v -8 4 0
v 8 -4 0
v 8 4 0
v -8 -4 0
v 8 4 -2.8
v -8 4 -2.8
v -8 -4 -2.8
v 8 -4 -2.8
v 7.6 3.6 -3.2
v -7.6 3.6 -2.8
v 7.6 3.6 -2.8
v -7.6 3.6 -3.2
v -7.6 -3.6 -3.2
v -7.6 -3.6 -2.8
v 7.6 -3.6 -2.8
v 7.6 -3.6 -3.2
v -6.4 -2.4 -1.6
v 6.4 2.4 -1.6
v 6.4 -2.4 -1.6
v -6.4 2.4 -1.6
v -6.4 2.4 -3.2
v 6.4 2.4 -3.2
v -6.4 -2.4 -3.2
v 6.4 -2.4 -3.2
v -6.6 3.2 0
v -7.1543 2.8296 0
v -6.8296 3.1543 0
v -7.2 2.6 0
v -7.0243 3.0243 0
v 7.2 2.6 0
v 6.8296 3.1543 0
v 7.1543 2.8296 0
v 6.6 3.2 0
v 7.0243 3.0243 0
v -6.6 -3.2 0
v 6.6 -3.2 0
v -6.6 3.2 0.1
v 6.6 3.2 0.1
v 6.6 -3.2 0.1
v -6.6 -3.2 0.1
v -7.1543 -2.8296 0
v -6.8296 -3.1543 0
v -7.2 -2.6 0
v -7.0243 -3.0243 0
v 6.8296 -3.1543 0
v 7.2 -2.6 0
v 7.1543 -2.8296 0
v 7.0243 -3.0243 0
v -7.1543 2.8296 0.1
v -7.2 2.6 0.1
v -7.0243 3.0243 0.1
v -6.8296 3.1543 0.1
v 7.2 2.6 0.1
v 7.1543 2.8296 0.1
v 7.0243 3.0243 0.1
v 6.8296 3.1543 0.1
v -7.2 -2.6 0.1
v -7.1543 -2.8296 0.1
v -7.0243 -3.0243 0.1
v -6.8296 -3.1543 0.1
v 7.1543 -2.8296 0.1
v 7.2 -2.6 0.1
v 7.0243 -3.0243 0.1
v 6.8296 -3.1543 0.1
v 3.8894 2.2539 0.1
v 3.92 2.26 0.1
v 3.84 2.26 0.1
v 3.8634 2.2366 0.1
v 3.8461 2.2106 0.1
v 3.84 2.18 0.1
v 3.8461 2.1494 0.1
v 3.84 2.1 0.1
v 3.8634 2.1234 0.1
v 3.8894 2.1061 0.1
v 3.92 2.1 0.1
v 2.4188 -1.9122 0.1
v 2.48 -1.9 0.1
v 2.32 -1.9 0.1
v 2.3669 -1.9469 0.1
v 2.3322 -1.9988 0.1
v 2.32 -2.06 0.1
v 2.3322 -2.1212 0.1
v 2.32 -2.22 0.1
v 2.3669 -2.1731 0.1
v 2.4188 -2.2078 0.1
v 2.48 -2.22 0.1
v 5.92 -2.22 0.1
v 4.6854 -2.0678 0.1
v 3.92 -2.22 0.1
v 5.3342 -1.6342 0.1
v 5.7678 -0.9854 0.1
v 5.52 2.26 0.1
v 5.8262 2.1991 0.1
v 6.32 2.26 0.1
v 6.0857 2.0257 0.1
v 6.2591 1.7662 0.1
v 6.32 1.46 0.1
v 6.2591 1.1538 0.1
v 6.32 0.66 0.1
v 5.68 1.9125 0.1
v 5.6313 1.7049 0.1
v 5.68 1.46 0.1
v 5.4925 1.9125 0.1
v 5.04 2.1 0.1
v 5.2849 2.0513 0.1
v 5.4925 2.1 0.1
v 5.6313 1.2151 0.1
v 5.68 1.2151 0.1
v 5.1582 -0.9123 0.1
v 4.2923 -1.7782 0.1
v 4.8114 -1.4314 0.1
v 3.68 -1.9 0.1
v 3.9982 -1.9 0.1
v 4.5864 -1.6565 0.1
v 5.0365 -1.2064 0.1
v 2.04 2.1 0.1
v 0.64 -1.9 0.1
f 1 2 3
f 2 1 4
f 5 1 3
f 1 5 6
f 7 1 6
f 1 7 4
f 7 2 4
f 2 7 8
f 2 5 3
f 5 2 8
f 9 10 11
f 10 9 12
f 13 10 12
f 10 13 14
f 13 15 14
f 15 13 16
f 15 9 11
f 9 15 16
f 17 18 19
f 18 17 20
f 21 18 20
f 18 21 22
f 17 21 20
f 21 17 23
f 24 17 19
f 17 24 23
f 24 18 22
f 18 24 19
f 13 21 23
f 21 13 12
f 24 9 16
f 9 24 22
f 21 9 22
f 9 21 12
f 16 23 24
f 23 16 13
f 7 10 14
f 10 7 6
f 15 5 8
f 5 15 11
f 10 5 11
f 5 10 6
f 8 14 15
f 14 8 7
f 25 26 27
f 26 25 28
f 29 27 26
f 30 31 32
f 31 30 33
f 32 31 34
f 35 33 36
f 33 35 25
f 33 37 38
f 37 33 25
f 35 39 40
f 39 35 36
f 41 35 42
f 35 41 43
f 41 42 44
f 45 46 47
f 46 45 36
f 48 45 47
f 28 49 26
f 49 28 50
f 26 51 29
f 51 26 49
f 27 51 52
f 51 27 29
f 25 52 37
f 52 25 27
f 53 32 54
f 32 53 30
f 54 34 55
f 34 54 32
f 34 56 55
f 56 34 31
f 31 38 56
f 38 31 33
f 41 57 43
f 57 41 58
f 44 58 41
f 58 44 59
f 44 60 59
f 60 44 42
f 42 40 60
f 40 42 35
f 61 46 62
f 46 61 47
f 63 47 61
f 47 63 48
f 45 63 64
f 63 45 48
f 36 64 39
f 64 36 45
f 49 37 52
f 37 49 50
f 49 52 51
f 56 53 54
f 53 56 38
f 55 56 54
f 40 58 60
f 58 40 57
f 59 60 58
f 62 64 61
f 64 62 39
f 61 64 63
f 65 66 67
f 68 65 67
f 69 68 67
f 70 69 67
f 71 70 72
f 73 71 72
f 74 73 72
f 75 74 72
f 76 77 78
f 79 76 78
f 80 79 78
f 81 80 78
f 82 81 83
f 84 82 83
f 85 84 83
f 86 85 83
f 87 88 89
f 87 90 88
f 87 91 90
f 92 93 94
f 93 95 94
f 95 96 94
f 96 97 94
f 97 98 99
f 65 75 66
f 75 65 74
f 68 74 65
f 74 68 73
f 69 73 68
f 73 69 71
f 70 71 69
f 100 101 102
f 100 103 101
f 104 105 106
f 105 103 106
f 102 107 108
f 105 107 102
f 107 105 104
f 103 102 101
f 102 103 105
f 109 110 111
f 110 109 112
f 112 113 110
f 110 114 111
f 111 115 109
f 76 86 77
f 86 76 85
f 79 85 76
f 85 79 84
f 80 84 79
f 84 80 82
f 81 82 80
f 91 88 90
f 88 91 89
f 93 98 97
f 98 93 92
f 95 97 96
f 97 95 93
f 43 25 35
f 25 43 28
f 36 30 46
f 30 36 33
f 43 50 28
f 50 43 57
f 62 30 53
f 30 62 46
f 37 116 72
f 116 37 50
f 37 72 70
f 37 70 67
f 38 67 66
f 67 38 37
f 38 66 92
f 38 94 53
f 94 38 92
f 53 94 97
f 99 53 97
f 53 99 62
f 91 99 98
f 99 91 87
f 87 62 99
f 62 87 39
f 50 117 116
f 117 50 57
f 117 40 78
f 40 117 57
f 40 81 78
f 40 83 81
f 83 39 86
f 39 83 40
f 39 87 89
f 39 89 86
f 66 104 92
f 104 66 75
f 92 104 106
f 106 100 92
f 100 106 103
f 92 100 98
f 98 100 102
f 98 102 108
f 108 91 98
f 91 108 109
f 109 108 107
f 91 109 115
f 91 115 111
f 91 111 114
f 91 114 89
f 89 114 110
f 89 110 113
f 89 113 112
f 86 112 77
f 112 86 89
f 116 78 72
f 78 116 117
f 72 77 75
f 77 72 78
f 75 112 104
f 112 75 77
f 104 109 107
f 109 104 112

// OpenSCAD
// file: ../p/box5.scad
use <../lib.scad>
function ldraw_lib__box5() = [
// 0 Box with 5 Faces and All Edges
// 0 Name: box5.dat
// 0 Author: James Jessiman
// 0 !LDRAW_ORG Primitive UPDATE 2012-01
// 0 !LICENSE Licensed under CC BY 4.0 : see CAreadme.txt
// 
// 0 BFC CERTIFY CCW
  [0,"BFC","CERTIFY"],
  [0,"BFC","CCW"],
// 
// 0 !HISTORY 2002-04-03 [sbliss] Modified for BFC compliance
// 0 !HISTORY 2002-04-25 [PTadmin] Official Update 2002-02
// 0 !HISTORY 2007-06-24 [PTadmin] Header formatted for Contributor Agreement
// 0 !HISTORY 2008-07-01 [PTadmin] Official Update 2008-01
// 0 !HISTORY 2012-02-16 [Philo] Changed to CCW
// 0 !HISTORY 2012-03-30 [PTadmin] Official Update 2012-01
// 
// 
// 2 24 1 1 1 -1 1 1
  [2,24,1,1,1,-1,1,1],
// 2 24 -1 1 1 -1 1 -1
  [2,24,-1,1,1,-1,1,-1],
// 2 24 -1 1 -1 1 1 -1
  [2,24,-1,1,-1,1,1,-1],
// 2 24 1 1 -1 1 1 1
  [2,24,1,1,-1,1,1,1],
// 2 24 1 0 1 -1 0 1
  [2,24,1,0,1,-1,0,1],
// 2 24 -1 0 1 -1 0 -1
  [2,24,-1,0,1,-1,0,-1],
// 2 24 -1 0 -1 1 0 -1
  [2,24,-1,0,-1,1,0,-1],
// 2 24 1 0 -1 1 0 1
  [2,24,1,0,-1,1,0,1],
// 2 24 1 0 1 1 1 1
  [2,24,1,0,1,1,1,1],
// 2 24 -1 0 1 -1 1 1
  [2,24,-1,0,1,-1,1,1],
// 2 24 1 0 -1 1 1 -1
  [2,24,1,0,-1,1,1,-1],
// 2 24 -1 0 -1 -1 1 -1
  [2,24,-1,0,-1,-1,1,-1],
// 4 16 -1 1 1 1 1 1 1 1 -1 -1 1 -1
  [4,16,-1,1,1,1,1,1,1,1,-1,-1,1,-1],
// 4 16 -1 1 1 -1 0 1 1 0 1 1 1 1
  [4,16,-1,1,1,-1,0,1,1,0,1,1,1,1],
// 4 16 -1 1 -1 -1 0 -1 -1 0 1 -1 1 1
  [4,16,-1,1,-1,-1,0,-1,-1,0,1,-1,1,1],
// 4 16 1 1 -1 1 0 -1 -1 0 -1 -1 1 -1
  [4,16,1,1,-1,1,0,-1,-1,0,-1,-1,1,-1],
// 4 16 1 1 1 1 0 1 1 0 -1 1 1 -1
  [4,16,1,1,1,1,0,1,1,0,-1,1,1,-1],
];
module ldraw_lib__box5(step=0, col=false, unit=2/5, alt=false, line=0.2, solid=!$preview)
    makepoly(ldraw_lib__box5(), step=step, col=col, unit=unit, alt=alt, line=line, solid=solid);
ldraw_lib__box5(line=0.2);
// file: ../p/box4.scad
use <../lib.scad>
function ldraw_lib__box4() = [
// 0 Box with 4 Faces (2 Parallel Pairs) and All Edges
// 0 Name: box4.dat
// 0 Author: James Jessiman
// 0 !LDRAW_ORG Primitive UPDATE 2012-01
// 0 !LICENSE Licensed under CC BY 4.0 : see CAreadme.txt
// 
// 0 BFC CERTIFY CCW
  [0,"BFC","CERTIFY"],
  [0,"BFC","CCW"],
// 
// 0 !HISTORY 2002-04-03 [sbliss] Modified for BFC compliance
// 0 !HISTORY 2002-04-25 [PTadmin] Official Update 2002-02
// 0 !HISTORY 2007-06-24 [PTadmin] Header formatted for Contributor Agreement
// 0 !HISTORY 2008-07-01 [PTadmin] Official Update 2008-01
// 0 !HISTORY 2012-02-16 [Philo] Changed to CCW
// 0 !HISTORY 2012-03-30 [PTadmin] Official Update 2012-01
// 
// 
// 2 24 1 1 1 -1 1 1
  [2,24,1,1,1,-1,1,1],
// 2 24 -1 1 1 -1 1 -1
  [2,24,-1,1,1,-1,1,-1],
// 2 24 -1 1 -1 1 1 -1
  [2,24,-1,1,-1,1,1,-1],
// 2 24 1 1 -1 1 1 1
  [2,24,1,1,-1,1,1,1],
// 2 24 1 0 1 -1 0 1
  [2,24,1,0,1,-1,0,1],
// 2 24 -1 0 1 -1 0 -1
  [2,24,-1,0,1,-1,0,-1],
// 2 24 -1 0 -1 1 0 -1
  [2,24,-1,0,-1,1,0,-1],
// 2 24 1 0 -1 1 0 1
  [2,24,1,0,-1,1,0,1],
// 2 24 1 0 1 1 1 1
  [2,24,1,0,1,1,1,1],
// 2 24 -1 0 1 -1 1 1
  [2,24,-1,0,1,-1,1,1],
// 2 24 1 0 -1 1 1 -1
  [2,24,1,0,-1,1,1,-1],
// 2 24 -1 0 -1 -1 1 -1
  [2,24,-1,0,-1,-1,1,-1],
// 4 16 -1 1 1 -1 0 1 1 0 1 1 1 1
  [4,16,-1,1,1,-1,0,1,1,0,1,1,1,1],
// 4 16 -1 1 -1 -1 0 -1 -1 0 1 -1 1 1
  [4,16,-1,1,-1,-1,0,-1,-1,0,1,-1,1,1],
// 4 16 1 1 -1 1 0 -1 -1 0 -1 -1 1 -1
  [4,16,1,1,-1,1,0,-1,-1,0,-1,-1,1,-1],
// 4 16 1 1 1 1 0 1 1 0 -1 1 1 -1
  [4,16,1,1,1,1,0,1,1,0,-1,1,1,-1],
];
module ldraw_lib__box4(step=0, col=false, unit=2/5, alt=false, line=0.2, solid=!$preview)
    makepoly(ldraw_lib__box4(), step=step, col=col, unit=unit, alt=alt, line=line, solid=solid);
ldraw_lib__box4(line=0.2);
// file: ../p/box3u12.scad
use <../lib.scad>
function ldraw_lib__box3u12() = [
// 0 Box with 3 Parallel Faces without Any Edges
// 0 Name: box3u12.dat
// 0 Author: J.C. Tchang [tchang]
// 0 !LDRAW_ORG Primitive UPDATE 2014-02
// 0 !LICENSE Licensed under CC BY 4.0 : see CAreadme.txt
// 
// 0 BFC CERTIFY CCW
  [0,"BFC","CERTIFY"],
  [0,"BFC","CCW"],
// 
// 0 !HISTORY 2014-12-23 [PTadmin] Official Update 2014-02
// 
// 
// 4 16 -1 1 1 1 1 1 1 1 -1 -1 1 -1
  [4,16,-1,1,1,1,1,1,1,1,-1,-1,1,-1],
// 4 16 -1 1 1 -1 0 1 1 0 1 1 1 1
  [4,16,-1,1,1,-1,0,1,1,0,1,1,1,1],
// 4 16 1 1 -1 1 0 -1 -1 0 -1 -1 1 -1
  [4,16,1,1,-1,1,0,-1,-1,0,-1,-1,1,-1],
];
module ldraw_lib__box3u12(step=0, col=false, unit=2/5, alt=false, line=0.2, solid=!$preview)
    makepoly(ldraw_lib__box3u12(), step=step, col=col, unit=unit, alt=alt, line=line, solid=solid);
ldraw_lib__box3u12(line=0.2);
// file: ../p/5-16ndis.scad
use <../lib.scad>
function ldraw_lib__5_16ndis() = [
// 0 Disc Negative 0.3125
// 0 Name: 5-16ndis.dat
// 0 Author: Max Martin Richter [MMR1988]
// 0 !LDRAW_ORG Primitive UPDATE 2013-01
// 0 !LICENSE Licensed under CC BY 4.0 : see CAreadme.txt
// 
// 0 BFC CERTIFY CCW
  [0,"BFC","CERTIFY"],
  [0,"BFC","CCW"],
// 
// 0 !HISTORY 2013-07-21 [PTadmin] Official Update 2013-01
// 
// 
// 3 16 1 0 1 0.9239 0 0.3827 1 0 0
  [3,16,1,0,1,0.9239,0,0.3827,1,0,0],
// 3 16 1 0 1 0.7071 0 0.7071 0.9239 0 0.3827
  [3,16,1,0,1,0.7071,0,0.7071,0.9239,0,0.3827],
// 3 16 1 0 1 0.3827 0 0.9239 0.7071 0 0.7071
  [3,16,1,0,1,0.3827,0,0.9239,0.7071,0,0.7071],
// 3 16 1 0 1 0 0 1 0.3827 0 0.9239
  [3,16,1,0,1,0,0,1,0.3827,0,0.9239],
// 3 16 -1 0 1 -0.3827 0 0.9239 0 0 1
  [3,16,-1,0,1,-0.3827,0,0.9239,0,0,1],
// 0 // Build by Primitive Generator 2
];
module ldraw_lib__5_16ndis(step=0, col=false, unit=2/5, alt=false, line=0.2, solid=!$preview)
    makepoly(ldraw_lib__5_16ndis(), step=step, col=col, unit=unit, alt=alt, line=line, solid=solid);
ldraw_lib__5_16ndis(line=0.2);
// file: ../p/5-16chrd.scad
use <../lib.scad>
function ldraw_lib__5_16chrd() = [
// 0 Chord 0.3125
// 0 Name: 5-16chrd.dat
// 0 Author: Niels Karsdorp [nielsk]
// 0 !LDRAW_ORG Primitive UPDATE 2010-01
// 0 !LICENSE Licensed under CC BY 4.0 : see CAreadme.txt
// 
// 0 BFC CERTIFY CCW
  [0,"BFC","CERTIFY"],
  [0,"BFC","CCW"],
// 
// 0 !HISTORY 2010-04-05 [PTadmin] Official Update 2010-01
// 
// 
// 4 16 1 0 0 0.9239 0 0.3827 0 0 1 -0.3827 0 0.9239
  [4,16,1,0,0,0.9239,0,0.3827,0,0,1,-0.3827,0,0.9239],
// 4 16 0.9239 0 0.3827 0.7071 0 0.7071 0.3827 0 0.9239 0 0 1
  [4,16,0.9239,0,0.3827,0.7071,0,0.7071,0.3827,0,0.9239,0,0,1],
// 0
// 
];
module ldraw_lib__5_16chrd(step=0, col=false, unit=2/5, alt=false, line=0.2, solid=!$preview)
    makepoly(ldraw_lib__5_16chrd(), step=step, col=col, unit=unit, alt=alt, line=line, solid=solid);
ldraw_lib__5_16chrd(line=0.2);
// file: ../p/3-16tang.scad
use <../lib.scad>
function ldraw_lib__3_16tang() = [
// 0 Disc Negative Tangent 0.1875
// 0 Name: 3-16tang.dat
// 0 Author: Massimo Maso [Sirio]
// 0 !LDRAW_ORG Primitive UPDATE 2022-03
// 0 !LICENSE Licensed under CC BY 4.0 : see CAreadme.txt
// 
// 0 BFC CERTIFY CCW
  [0,"BFC","CERTIFY"],
  [0,"BFC","CCW"],
// 
// 0 !HISTORY 2022-05-07 [PTadmin] Official Update 2022-03
// 
// 
// 3 16 1 0 0 1 0 0.1989 0.9239 0 0.3827
  [3,16,1,0,0,1,0,0.1989,0.9239,0,0.3827],
// 3 16 0.9239 0 0.3827 0.8478 0 0.5665 0.7071 0 0.7071
  [3,16,0.9239,0,0.3827,0.8478,0,0.5665,0.7071,0,0.7071],
// 3 16 0.7071 0 0.7071 0.5665 0 0.8478 0.3827 0 0.9239
  [3,16,0.7071,0,0.7071,0.5665,0,0.8478,0.3827,0,0.9239],
];
module ldraw_lib__3_16tang(step=0, col=false, unit=2/5, alt=false, line=0.2, solid=!$preview)
    makepoly(ldraw_lib__3_16tang(), step=step, col=col, unit=unit, alt=alt, line=line, solid=solid);
ldraw_lib__3_16tang(line=0.2);
// file: ../p/3-16ndis.scad
use <../lib.scad>
function ldraw_lib__3_16ndis() = [
// 0 Disc Negative 0.1875
// 0 Name: 3-16ndis.dat
// 0 Author: Magnus Forsberg [MagFors]
// 0 !LDRAW_ORG Primitive UPDATE 2024-01
// 0 !LICENSE Licensed under CC BY 4.0 : see CAreadme.txt
// 
// 0 BFC CERTIFY CCW
  [0,"BFC","CERTIFY"],
  [0,"BFC","CCW"],
// 
// 0 !HISTORY 2009-05-02 [PTadmin] Official Update 2009-01
// 0 !HISTORY 2024-01-03 [MagFors] Complete regeneration, original by guyvivan
// 0 !HISTORY 2024-01-29 [OrionP] Official Update 2024-01
// 
// 3 16 1 0 1 0.9239 0 0.3827 1 0 0
  [3,16,1,0,1,0.9239,0,0.3827,1,0,0],
// 3 16 1 0 1 0.7071 0 0.7071 0.9239 0 0.3827
  [3,16,1,0,1,0.7071,0,0.7071,0.9239,0,0.3827],
// 3 16 1 0 1 0.3827 0 0.9239 0.7071 0 0.7071
  [3,16,1,0,1,0.3827,0,0.9239,0.7071,0,0.7071],
// 0 // Build by LDPartEditor (PrimGen 2.X)
];
module ldraw_lib__3_16ndis(step=0, col=false, unit=2/5, alt=false, line=0.2, solid=!$preview)
    makepoly(ldraw_lib__3_16ndis(), step=step, col=col, unit=unit, alt=alt, line=line, solid=solid);
ldraw_lib__3_16ndis(line=0.2);
// file: ../p/3-16chrd.scad
use <../lib.scad>
function ldraw_lib__3_16chrd() = [
// 0 Chord 0.1875
// 0 Name: 3-16chrd.dat
// 0 Author: Niels Karsdorp [nielsk]
// 0 !LDRAW_ORG Primitive UPDATE 2009-01
// 0 !LICENSE Licensed under CC BY 4.0 : see CAreadme.txt
// 
// 0 BFC CERTIFY CCW
  [0,"BFC","CERTIFY"],
  [0,"BFC","CCW"],
// 
// 0 !HISTORY 2009-05-02 [PTadmin] Official Update 2009-01
// 
// 
// 4 16 1 0 0 0.9239 0 0.3827 0.7071 0 0.7071 0.3827 0 0.9239
  [4,16,1,0,0,0.9239,0,0.3827,0.7071,0,0.7071,0.3827,0,0.9239],
// 0
// 
];
module ldraw_lib__3_16chrd(step=0, col=false, unit=2/5, alt=false, line=0.2, solid=!$preview)
    makepoly(ldraw_lib__3_16chrd(), step=step, col=col, unit=unit, alt=alt, line=line, solid=solid);
ldraw_lib__3_16chrd(line=0.2);
// file: ../p/2-4ndis.scad
use <../lib.scad>
function ldraw_lib__2_4ndis() = [
// 0 Disc Negative 0.5
// 0 Name: 2-4ndis.dat
// 0 Author: James Jessiman
// 0 !LDRAW_ORG Primitive UPDATE 2012-01
// 0 !LICENSE Licensed under CC BY 4.0 : see CAreadme.txt
// 
// 0 BFC CERTIFY CCW
  [0,"BFC","CERTIFY"],
  [0,"BFC","CCW"],
// 
// 0 !HISTORY 2002-03-23 [sbliss] Added BFC statement; compacted code
// 0 !HISTORY 2002-04-25 [PTadmin] Official Update 2002-02
// 0 !HISTORY 2007-06-24 [PTadmin] Header formatted for Contributor Agreement
// 0 !HISTORY 2008-07-01 [PTadmin] Official Update 2008-01
// 0 !HISTORY 2012-02-16 [Philo] Changed to CCW
// 0 !HISTORY 2012-03-30 [PTadmin] Official Update 2012-01
// 
// 
// 3 16 0.9239 0 0.3827 1 0 0 1 0 1
  [3,16,0.9239,0,0.3827,1,0,0,1,0,1],
// 3 16 0.7071 0 0.7071 0.9239 0 0.3827 1 0 1
  [3,16,0.7071,0,0.7071,0.9239,0,0.3827,1,0,1],
// 3 16 0.3827 0 0.9239 0.7071 0 0.7071 1 0 1
  [3,16,0.3827,0,0.9239,0.7071,0,0.7071,1,0,1],
// 3 16 0 0 1 0.3827 0 0.9239 1 0 1
  [3,16,0,0,1,0.3827,0,0.9239,1,0,1],
// 3 16 -0.3827 0 0.9239 0 0 1 -1 0 1
  [3,16,-0.3827,0,0.9239,0,0,1,-1,0,1],
// 3 16 -0.7071 0 0.7071 -0.3827 0 0.9239 -1 0 1
  [3,16,-0.7071,0,0.7071,-0.3827,0,0.9239,-1,0,1],
// 3 16 -0.9239 0 0.3827 -0.7071 0 0.7071 -1 0 1
  [3,16,-0.9239,0,0.3827,-0.7071,0,0.7071,-1,0,1],
// 3 16 -1 0 0 -0.9239 0 0.3827 -1 0 1
  [3,16,-1,0,0,-0.9239,0,0.3827,-1,0,1],
];
module ldraw_lib__2_4ndis(step=0, col=false, unit=2/5, alt=false, line=0.2, solid=!$preview)
    makepoly(ldraw_lib__2_4ndis(), step=step, col=col, unit=unit, alt=alt, line=line, solid=solid);
ldraw_lib__2_4ndis(line=0.2);
// file: ../p/2-4chrd.scad
use <../lib.scad>
function ldraw_lib__2_4chrd() = [
// 0 Chord 0.5
// 0 Name: 2-4chrd.dat
// 0 Author: Philippe Hurbain [Philo]
// 0 !LDRAW_ORG Primitive UPDATE 2014-01
// 0 !LICENSE Licensed under CC BY 4.0 : see CAreadme.txt
// 
// 0 BFC CERTIFY CCW
  [0,"BFC","CERTIFY"],
  [0,"BFC","CCW"],
// 
// 0 !HISTORY 2014-06-21 [PTadmin] Official Update 2014-01
// 
// 
// 4 16 0.9239 0 0.3827 -0.9239 0 0.3827 -1 0 0 1 0 0
  [4,16,0.9239,0,0.3827,-0.9239,0,0.3827,-1,0,0,1,0,0],
// 4 16 0.7071 0 0.7071 -0.7071 0 0.7071 -0.9239 0 0.3827 0.9239 0 0.3827
  [4,16,0.7071,0,0.7071,-0.7071,0,0.7071,-0.9239,0,0.3827,0.9239,0,0.3827],
// 4 16 0.3827 0 0.9239 -0.3827 0 0.9239 -0.7071 0 0.7071 0.7071 0 0.7071
  [4,16,0.3827,0,0.9239,-0.3827,0,0.9239,-0.7071,0,0.7071,0.7071,0,0.7071],
// 3 16 0 0 1 -0.3827 0 0.9239 0.3827 0 0.9239
  [3,16,0,0,1,-0.3827,0,0.9239,0.3827,0,0.9239],
];
module ldraw_lib__2_4chrd(step=0, col=false, unit=2/5, alt=false, line=0.2, solid=!$preview)
    makepoly(ldraw_lib__2_4chrd(), step=step, col=col, unit=unit, alt=alt, line=line, solid=solid);
ldraw_lib__2_4chrd(line=0.2);
// file: ../p/1-8tndis.scad
use <../lib.scad>
function ldraw_lib__1_8tndis() = [
// 0 Disc Negative Truncated 0.125
// 0 Name: 1-8tndis.dat
// 0 Author: Massimo Maso [Sirio]
// 0 !LDRAW_ORG Primitive UPDATE 2022-02
// 0 !LICENSE Licensed under CC BY 4.0 : see CAreadme.txt
// 
// 0 BFC CERTIFY CCW
  [0,"BFC","CERTIFY"],
  [0,"BFC","CCW"],
// 
// 0 !HISTORY 2022-03-06 [PTadmin] Official Update 2022-02
// 
// 
// 3 16 1 0 .7071 .9239 0 .3827 1 0 0
  [3,16,1,0,.7071,.9239,0,.3827,1,0,0],
// 3 16 1 0 .7071 .7071 0 .7071 .9239 0 .3827
  [3,16,1,0,.7071,.7071,0,.7071,.9239,0,.3827],
];
module ldraw_lib__1_8tndis(step=0, col=false, unit=2/5, alt=false, line=0.2, solid=!$preview)
    makepoly(ldraw_lib__1_8tndis(), step=step, col=col, unit=unit, alt=alt, line=line, solid=solid);
ldraw_lib__1_8tndis(line=0.2);
// file: ../p/1-4cyli.scad
use <../lib.scad>
function ldraw_lib__1_4cyli() = [
// 0 Cylinder 0.25
// 0 Name: 1-4cyli.dat
// 0 Author: James Jessiman
// 0 !LDRAW_ORG Primitive UPDATE 2012-01
// 0 !LICENSE Licensed under CC BY 4.0 : see CAreadme.txt
// 
// 0 BFC CERTIFY CCW
  [0,"BFC","CERTIFY"],
  [0,"BFC","CCW"],
// 
// 0 !HISTORY 2002-03-23 [sbliss] Added BFC statement.
// 0 !HISTORY 2002-04-25 [PTadmin] Official Update 2002-02
// 0 !HISTORY 2007-06-22 [PTadmin] Header formatted for Contributor Agreement
// 0 !HISTORY 2008-07-01 [PTadmin] Official Update 2008-01
// 0 !HISTORY 2012-02-16 [Philo] Changed to CCW
// 0 !HISTORY 2012-03-30 [PTadmin] Official Update 2012-01
// 
// 
// 4 16 1 1 0 0.9239 1 0.3827 0.9239 0 0.3827 1 0 0
  [4,16,1,1,0,0.9239,1,0.3827,0.9239,0,0.3827,1,0,0],
// 5 24 1 0 0 1 1 0 0.9239 0 0.3827 1 0 -1
  [5,24,1,0,0,1,1,0,0.9239,0,0.3827,1,0,-1],
// 4 16 0.9239 1 0.3827 0.7071 1 0.7071 0.7071 0 0.7071 0.9239 0 0.3827
  [4,16,0.9239,1,0.3827,0.7071,1,0.7071,0.7071,0,0.7071,0.9239,0,0.3827],
// 5 24 0.9239 0 0.3827 0.9239 1 0.3827 0.7071 0 0.7071 1 0 0
  [5,24,0.9239,0,0.3827,0.9239,1,0.3827,0.7071,0,0.7071,1,0,0],
// 4 16 0.7071 1 0.7071 0.3827 1 0.9239 0.3827 0 0.9239 0.7071 0 0.7071
  [4,16,0.7071,1,0.7071,0.3827,1,0.9239,0.3827,0,0.9239,0.7071,0,0.7071],
// 5 24 0.7071 0 0.7071 0.7071 1 0.7071 0.3827 0 0.9239 0.9239 0 0.3827
  [5,24,0.7071,0,0.7071,0.7071,1,0.7071,0.3827,0,0.9239,0.9239,0,0.3827],
// 4 16 0.3827 1 0.9239 0 1 1 0 0 1 0.3827 0 0.9239
  [4,16,0.3827,1,0.9239,0,1,1,0,0,1,0.3827,0,0.9239],
// 5 24 0.3827 0 0.9239 0.3827 1 0.9239 0 0 1 0.7071 0 0.7071
  [5,24,0.3827,0,0.9239,0.3827,1,0.9239,0,0,1,0.7071,0,0.7071],
// 5 24 0 0 1 0 1 1 0.3827 0 0.9239 -1 0 1
  [5,24,0,0,1,0,1,1,0.3827,0,0.9239,-1,0,1],
];
module ldraw_lib__1_4cyli(step=0, col=false, unit=2/5, alt=false, line=0.2, solid=!$preview)
    makepoly(ldraw_lib__1_4cyli(), step=step, col=col, unit=unit, alt=alt, line=line, solid=solid);
ldraw_lib__1_4cyli(line=0.2);
// file: ../p/1-4chrd.scad
use <../lib.scad>
function ldraw_lib__1_4chrd() = [
// 0 Chord 0.25
// 0 Name: 1-4chrd.dat
// 0 Author: Max Martin Richter [MMR1988]
// 0 !LDRAW_ORG Primitive UPDATE 2023-05
// 0 !LICENSE Licensed under CC BY 4.0 : see CAreadme.txt
// 
// 0 BFC CERTIFY CCW
  [0,"BFC","CERTIFY"],
  [0,"BFC","CCW"],
// 
// 0 !HISTORY 2004-04-22 [PTadmin] Official Update 2004-02
// 0 !HISTORY 2007-10-09 [PTadmin] Header formatted for Contributor Agreement
// 0 !HISTORY 2008-07-01 [PTadmin] Official Update 2008-01
// 0 !HISTORY 2012-08-02 [MMR1988] Re-creation with PrimGen2 and Rectifier
// 0 !HISTORY 2012-08-09 [PTadmin] Official Update 2012-02
// 0 !HISTORY 2023-10-27 [OrionP] Change author to MMR1988 from hafhead
// 0 !HISTORY 2023-10-31 [OrionP] Official Update 2023-05
// 
// 4 16 0.9239 0 0.3827 0.3827 0 0.9239 0 0 1 1 0 0
  [4,16,0.9239,0,0.3827,0.3827,0,0.9239,0,0,1,1,0,0],
// 3 16 0.7071 0 0.7071 0.3827 0 0.9239 0.9239 0 0.3827
  [3,16,0.7071,0,0.7071,0.3827,0,0.9239,0.9239,0,0.3827],
];
module ldraw_lib__1_4chrd(step=0, col=false, unit=2/5, alt=false, line=0.2, solid=!$preview)
    makepoly(ldraw_lib__1_4chrd(), step=step, col=col, unit=unit, alt=alt, line=line, solid=solid);
ldraw_lib__1_4chrd(line=0.2);
// file: ../p/1-16tndis.scad
use <../lib.scad>
function ldraw_lib__1_16tndis() = [
// 0 Disc Negative Truncated 0.0625
// 0 Name: 1-16tndis.dat
// 0 Author: Massimo Maso [Sirio]
// 0 !LDRAW_ORG Primitive UPDATE 2022-03
// 0 !LICENSE Licensed under CC BY 4.0 : see CAreadme.txt
// 
// 0 BFC CERTIFY CCW
  [0,"BFC","CERTIFY"],
  [0,"BFC","CCW"],
// 
// 0 !HISTORY 2022-05-07 [PTadmin] Official Update 2022-03
// 
// 
// 3 16 1 0 .3827 .9239 0 .3827 1 0 0
  [3,16,1,0,.3827,.9239,0,.3827,1,0,0],
];
module ldraw_lib__1_16tndis(step=0, col=false, unit=2/5, alt=false, line=0.2, solid=!$preview)
    makepoly(ldraw_lib__1_16tndis(), step=step, col=col, unit=unit, alt=alt, line=line, solid=solid);
ldraw_lib__1_16tndis(line=0.2);
// file: s/3069bs01.scad
use <../../lib.scad>
use <../../p/box4.scad>
use <../../p/box5.scad>
function ldraw_lib__s__3069bs01() = [
// 0 ~Tile  1 x  2 with Groove without Top Face
// 0 Name: s\3069bs01.dat
// 0 Author: Santeri Piippo [arezey]
// 0 !LDRAW_ORG Subpart UPDATE 2010-02
// 0 !LICENSE Licensed under CC BY 4.0 : see CAreadme.txt
// 
// 0 BFC CERTIFY CCW
  [0,"BFC","CERTIFY"],
  [0,"BFC","CCW"],
// 
// 0 !HISTORY 2010-07-05 [PTadmin] Official Update 2010-02
// 
// 
// 1 16 0 0 0 20 0 0 0 7 0 0 0 10 box4.dat
  [1,16,0,0,0,20,0,0,0,7,0,0,0,10, ldraw_lib__box4()],
// 1 16 0 7 0 19 0 0 0 1 0 0 0 9 box4.dat
  [1,16,0,7,0,19,0,0,0,1,0,0,0,9, ldraw_lib__box4()],
// 0 BFC INVERTNEXT
  [0,"BFC","INVERTNEXT"],
// 1 16 0 8 0 16 0 0 0 -4 0 0 0 6 box5.dat
  [1,16,0,8,0,16,0,0,0,-4,0,0,0,6, ldraw_lib__box5()],
// 4 16 -19 8 9 -16 8 6 -16 8 -6 -19 8 -9
  [4,16,-19,8,9,-16,8,6,-16,8,-6,-19,8,-9],
// 4 16 19 8 -9 16 8 -6 16 8 6 19 8 9
  [4,16,19,8,-9,16,8,-6,16,8,6,19,8,9],
// 4 16 19 8 9 16 8 6 -16 8 6 -19 8 9
  [4,16,19,8,9,16,8,6,-16,8,6,-19,8,9],
// 4 16 -19 8 -9 -16 8 -6 16 8 -6 19 8 -9
  [4,16,-19,8,-9,-16,8,-6,16,8,-6,19,8,-9],
// 4 16 -20 7 10 -19 7 9 -19 7 -9 -20 7 -10
  [4,16,-20,7,10,-19,7,9,-19,7,-9,-20,7,-10],
// 4 16 20 7 -10 19 7 -9 19 7 9 20 7 10
  [4,16,20,7,-10,19,7,-9,19,7,9,20,7,10],
// 4 16 20 7 10 19 7 9 -19 7 9 -20 7 10
  [4,16,20,7,10,19,7,9,-19,7,9,-20,7,10],
// 4 16 -20 7 -10 -19 7 -9 19 7 -9 20 7 -10
  [4,16,-20,7,-10,-19,7,-9,19,7,-9,20,7,-10],
// 0 //
];
module ldraw_lib__s__3069bs01(step=0, col=false, unit=2/5, alt=false, line=0.2, solid=!$preview)
    makepoly(ldraw_lib__s__3069bs01(), step=step, col=col, unit=unit, alt=alt, line=line, solid=solid);
ldraw_lib__s__3069bs01(line=0.2);
// file: 3069b.scad
use <../lib.scad>
use <s/3069bs01.scad>
function ldraw_lib__3069b() = [
// 0 Tile  1 x  2 with Groove
// 0 Name: 3069b.dat
// 0 Author: Santeri Piippo [arezey]
// 0 !LDRAW_ORG Part UPDATE 2010-02
// 0 !LICENSE Licensed under CC BY 4.0 : see CAreadme.txt
// 
// 0 BFC CERTIFY CCW
  [0,"BFC","CERTIFY"],
  [0,"BFC","CCW"],
// 
// 0 !KEYWORDS BrickLink 3069
// 
// 0 !HISTORY 2010-07-05 [PTadmin] Official Update 2010-02
// 
// 
// 4 16 20 0 -10 20 0 10 -20 0 10 -20 0 -10
  [4,16,20,0,-10,20,0,10,-20,0,10,-20,0,-10],
// 1 16 0 0 0 1 0 0 0 1 0 0 0 1 s\3069bs01.dat
  [1,16,0,0,0,1,0,0,0,1,0,0,0,1, ldraw_lib__s__3069bs01()],
// 0 //
];
module ldraw_lib__3069b(step=0, col=false, unit=2/5, alt=false, line=0.2, solid=!$preview)
    makepoly(ldraw_lib__3069b(), step=step, col=col, unit=unit, alt=alt, line=line, solid=solid);
ldraw_lib__3069b(line=0.2);
// main file
use <../lib.scad>
use <3069b.scad>
use <6177741h.scad>
function ldraw_lib__3069bd2k() = [
// 0 Tile  1 x  2 with Black Air Scope on Transparent Background Sticker
// 0 Name: 3069bd2k.dat
// 0 Author: Alfred Schmitz [AlfredS]
// 0 !LDRAW_ORG Shortcut UPDATE 2026-08
// 0 !LICENSE Licensed under CC BY 4.0 : see CAreadme.txt
// 
// 0 BFC CERTIFY CCW
  [0,"BFC","CERTIFY"],
  [0,"BFC","CCW"],
// 
// 0 !CATEGORY Sticker Shortcut
// 0 !KEYWORDS AMG, GT3, Mercedes, Set 75877, Speed Champions
// 
// 0 !HISTORY 2026-08-31 [OrionP] Official Update 2026-08
// 
// 1 16 0 0 0 1 0 0 0 1 0 0 0 1 3069b.dat
  [1,16,0,0,0,1,0,0,0,1,0,0,0,1, ldraw_lib__3069b()],
// 1 16 0 0 0 1 0 0 0 1 0 0 0 1 6177741h.dat
  [1,16,0,0,0,1,0,0,0,1,0,0,0,1, ldraw_lib__6177741h()],
];
module ldraw_lib__3069bd2k(step=0, col=false, unit=2/5, alt=false, line=0.2, solid=!$preview)
    makepoly(ldraw_lib__3069bd2k(), step=step, col=col, unit=unit, alt=alt, line=line, solid=solid);
ldraw_lib__3069bd2k(line=0.2);
